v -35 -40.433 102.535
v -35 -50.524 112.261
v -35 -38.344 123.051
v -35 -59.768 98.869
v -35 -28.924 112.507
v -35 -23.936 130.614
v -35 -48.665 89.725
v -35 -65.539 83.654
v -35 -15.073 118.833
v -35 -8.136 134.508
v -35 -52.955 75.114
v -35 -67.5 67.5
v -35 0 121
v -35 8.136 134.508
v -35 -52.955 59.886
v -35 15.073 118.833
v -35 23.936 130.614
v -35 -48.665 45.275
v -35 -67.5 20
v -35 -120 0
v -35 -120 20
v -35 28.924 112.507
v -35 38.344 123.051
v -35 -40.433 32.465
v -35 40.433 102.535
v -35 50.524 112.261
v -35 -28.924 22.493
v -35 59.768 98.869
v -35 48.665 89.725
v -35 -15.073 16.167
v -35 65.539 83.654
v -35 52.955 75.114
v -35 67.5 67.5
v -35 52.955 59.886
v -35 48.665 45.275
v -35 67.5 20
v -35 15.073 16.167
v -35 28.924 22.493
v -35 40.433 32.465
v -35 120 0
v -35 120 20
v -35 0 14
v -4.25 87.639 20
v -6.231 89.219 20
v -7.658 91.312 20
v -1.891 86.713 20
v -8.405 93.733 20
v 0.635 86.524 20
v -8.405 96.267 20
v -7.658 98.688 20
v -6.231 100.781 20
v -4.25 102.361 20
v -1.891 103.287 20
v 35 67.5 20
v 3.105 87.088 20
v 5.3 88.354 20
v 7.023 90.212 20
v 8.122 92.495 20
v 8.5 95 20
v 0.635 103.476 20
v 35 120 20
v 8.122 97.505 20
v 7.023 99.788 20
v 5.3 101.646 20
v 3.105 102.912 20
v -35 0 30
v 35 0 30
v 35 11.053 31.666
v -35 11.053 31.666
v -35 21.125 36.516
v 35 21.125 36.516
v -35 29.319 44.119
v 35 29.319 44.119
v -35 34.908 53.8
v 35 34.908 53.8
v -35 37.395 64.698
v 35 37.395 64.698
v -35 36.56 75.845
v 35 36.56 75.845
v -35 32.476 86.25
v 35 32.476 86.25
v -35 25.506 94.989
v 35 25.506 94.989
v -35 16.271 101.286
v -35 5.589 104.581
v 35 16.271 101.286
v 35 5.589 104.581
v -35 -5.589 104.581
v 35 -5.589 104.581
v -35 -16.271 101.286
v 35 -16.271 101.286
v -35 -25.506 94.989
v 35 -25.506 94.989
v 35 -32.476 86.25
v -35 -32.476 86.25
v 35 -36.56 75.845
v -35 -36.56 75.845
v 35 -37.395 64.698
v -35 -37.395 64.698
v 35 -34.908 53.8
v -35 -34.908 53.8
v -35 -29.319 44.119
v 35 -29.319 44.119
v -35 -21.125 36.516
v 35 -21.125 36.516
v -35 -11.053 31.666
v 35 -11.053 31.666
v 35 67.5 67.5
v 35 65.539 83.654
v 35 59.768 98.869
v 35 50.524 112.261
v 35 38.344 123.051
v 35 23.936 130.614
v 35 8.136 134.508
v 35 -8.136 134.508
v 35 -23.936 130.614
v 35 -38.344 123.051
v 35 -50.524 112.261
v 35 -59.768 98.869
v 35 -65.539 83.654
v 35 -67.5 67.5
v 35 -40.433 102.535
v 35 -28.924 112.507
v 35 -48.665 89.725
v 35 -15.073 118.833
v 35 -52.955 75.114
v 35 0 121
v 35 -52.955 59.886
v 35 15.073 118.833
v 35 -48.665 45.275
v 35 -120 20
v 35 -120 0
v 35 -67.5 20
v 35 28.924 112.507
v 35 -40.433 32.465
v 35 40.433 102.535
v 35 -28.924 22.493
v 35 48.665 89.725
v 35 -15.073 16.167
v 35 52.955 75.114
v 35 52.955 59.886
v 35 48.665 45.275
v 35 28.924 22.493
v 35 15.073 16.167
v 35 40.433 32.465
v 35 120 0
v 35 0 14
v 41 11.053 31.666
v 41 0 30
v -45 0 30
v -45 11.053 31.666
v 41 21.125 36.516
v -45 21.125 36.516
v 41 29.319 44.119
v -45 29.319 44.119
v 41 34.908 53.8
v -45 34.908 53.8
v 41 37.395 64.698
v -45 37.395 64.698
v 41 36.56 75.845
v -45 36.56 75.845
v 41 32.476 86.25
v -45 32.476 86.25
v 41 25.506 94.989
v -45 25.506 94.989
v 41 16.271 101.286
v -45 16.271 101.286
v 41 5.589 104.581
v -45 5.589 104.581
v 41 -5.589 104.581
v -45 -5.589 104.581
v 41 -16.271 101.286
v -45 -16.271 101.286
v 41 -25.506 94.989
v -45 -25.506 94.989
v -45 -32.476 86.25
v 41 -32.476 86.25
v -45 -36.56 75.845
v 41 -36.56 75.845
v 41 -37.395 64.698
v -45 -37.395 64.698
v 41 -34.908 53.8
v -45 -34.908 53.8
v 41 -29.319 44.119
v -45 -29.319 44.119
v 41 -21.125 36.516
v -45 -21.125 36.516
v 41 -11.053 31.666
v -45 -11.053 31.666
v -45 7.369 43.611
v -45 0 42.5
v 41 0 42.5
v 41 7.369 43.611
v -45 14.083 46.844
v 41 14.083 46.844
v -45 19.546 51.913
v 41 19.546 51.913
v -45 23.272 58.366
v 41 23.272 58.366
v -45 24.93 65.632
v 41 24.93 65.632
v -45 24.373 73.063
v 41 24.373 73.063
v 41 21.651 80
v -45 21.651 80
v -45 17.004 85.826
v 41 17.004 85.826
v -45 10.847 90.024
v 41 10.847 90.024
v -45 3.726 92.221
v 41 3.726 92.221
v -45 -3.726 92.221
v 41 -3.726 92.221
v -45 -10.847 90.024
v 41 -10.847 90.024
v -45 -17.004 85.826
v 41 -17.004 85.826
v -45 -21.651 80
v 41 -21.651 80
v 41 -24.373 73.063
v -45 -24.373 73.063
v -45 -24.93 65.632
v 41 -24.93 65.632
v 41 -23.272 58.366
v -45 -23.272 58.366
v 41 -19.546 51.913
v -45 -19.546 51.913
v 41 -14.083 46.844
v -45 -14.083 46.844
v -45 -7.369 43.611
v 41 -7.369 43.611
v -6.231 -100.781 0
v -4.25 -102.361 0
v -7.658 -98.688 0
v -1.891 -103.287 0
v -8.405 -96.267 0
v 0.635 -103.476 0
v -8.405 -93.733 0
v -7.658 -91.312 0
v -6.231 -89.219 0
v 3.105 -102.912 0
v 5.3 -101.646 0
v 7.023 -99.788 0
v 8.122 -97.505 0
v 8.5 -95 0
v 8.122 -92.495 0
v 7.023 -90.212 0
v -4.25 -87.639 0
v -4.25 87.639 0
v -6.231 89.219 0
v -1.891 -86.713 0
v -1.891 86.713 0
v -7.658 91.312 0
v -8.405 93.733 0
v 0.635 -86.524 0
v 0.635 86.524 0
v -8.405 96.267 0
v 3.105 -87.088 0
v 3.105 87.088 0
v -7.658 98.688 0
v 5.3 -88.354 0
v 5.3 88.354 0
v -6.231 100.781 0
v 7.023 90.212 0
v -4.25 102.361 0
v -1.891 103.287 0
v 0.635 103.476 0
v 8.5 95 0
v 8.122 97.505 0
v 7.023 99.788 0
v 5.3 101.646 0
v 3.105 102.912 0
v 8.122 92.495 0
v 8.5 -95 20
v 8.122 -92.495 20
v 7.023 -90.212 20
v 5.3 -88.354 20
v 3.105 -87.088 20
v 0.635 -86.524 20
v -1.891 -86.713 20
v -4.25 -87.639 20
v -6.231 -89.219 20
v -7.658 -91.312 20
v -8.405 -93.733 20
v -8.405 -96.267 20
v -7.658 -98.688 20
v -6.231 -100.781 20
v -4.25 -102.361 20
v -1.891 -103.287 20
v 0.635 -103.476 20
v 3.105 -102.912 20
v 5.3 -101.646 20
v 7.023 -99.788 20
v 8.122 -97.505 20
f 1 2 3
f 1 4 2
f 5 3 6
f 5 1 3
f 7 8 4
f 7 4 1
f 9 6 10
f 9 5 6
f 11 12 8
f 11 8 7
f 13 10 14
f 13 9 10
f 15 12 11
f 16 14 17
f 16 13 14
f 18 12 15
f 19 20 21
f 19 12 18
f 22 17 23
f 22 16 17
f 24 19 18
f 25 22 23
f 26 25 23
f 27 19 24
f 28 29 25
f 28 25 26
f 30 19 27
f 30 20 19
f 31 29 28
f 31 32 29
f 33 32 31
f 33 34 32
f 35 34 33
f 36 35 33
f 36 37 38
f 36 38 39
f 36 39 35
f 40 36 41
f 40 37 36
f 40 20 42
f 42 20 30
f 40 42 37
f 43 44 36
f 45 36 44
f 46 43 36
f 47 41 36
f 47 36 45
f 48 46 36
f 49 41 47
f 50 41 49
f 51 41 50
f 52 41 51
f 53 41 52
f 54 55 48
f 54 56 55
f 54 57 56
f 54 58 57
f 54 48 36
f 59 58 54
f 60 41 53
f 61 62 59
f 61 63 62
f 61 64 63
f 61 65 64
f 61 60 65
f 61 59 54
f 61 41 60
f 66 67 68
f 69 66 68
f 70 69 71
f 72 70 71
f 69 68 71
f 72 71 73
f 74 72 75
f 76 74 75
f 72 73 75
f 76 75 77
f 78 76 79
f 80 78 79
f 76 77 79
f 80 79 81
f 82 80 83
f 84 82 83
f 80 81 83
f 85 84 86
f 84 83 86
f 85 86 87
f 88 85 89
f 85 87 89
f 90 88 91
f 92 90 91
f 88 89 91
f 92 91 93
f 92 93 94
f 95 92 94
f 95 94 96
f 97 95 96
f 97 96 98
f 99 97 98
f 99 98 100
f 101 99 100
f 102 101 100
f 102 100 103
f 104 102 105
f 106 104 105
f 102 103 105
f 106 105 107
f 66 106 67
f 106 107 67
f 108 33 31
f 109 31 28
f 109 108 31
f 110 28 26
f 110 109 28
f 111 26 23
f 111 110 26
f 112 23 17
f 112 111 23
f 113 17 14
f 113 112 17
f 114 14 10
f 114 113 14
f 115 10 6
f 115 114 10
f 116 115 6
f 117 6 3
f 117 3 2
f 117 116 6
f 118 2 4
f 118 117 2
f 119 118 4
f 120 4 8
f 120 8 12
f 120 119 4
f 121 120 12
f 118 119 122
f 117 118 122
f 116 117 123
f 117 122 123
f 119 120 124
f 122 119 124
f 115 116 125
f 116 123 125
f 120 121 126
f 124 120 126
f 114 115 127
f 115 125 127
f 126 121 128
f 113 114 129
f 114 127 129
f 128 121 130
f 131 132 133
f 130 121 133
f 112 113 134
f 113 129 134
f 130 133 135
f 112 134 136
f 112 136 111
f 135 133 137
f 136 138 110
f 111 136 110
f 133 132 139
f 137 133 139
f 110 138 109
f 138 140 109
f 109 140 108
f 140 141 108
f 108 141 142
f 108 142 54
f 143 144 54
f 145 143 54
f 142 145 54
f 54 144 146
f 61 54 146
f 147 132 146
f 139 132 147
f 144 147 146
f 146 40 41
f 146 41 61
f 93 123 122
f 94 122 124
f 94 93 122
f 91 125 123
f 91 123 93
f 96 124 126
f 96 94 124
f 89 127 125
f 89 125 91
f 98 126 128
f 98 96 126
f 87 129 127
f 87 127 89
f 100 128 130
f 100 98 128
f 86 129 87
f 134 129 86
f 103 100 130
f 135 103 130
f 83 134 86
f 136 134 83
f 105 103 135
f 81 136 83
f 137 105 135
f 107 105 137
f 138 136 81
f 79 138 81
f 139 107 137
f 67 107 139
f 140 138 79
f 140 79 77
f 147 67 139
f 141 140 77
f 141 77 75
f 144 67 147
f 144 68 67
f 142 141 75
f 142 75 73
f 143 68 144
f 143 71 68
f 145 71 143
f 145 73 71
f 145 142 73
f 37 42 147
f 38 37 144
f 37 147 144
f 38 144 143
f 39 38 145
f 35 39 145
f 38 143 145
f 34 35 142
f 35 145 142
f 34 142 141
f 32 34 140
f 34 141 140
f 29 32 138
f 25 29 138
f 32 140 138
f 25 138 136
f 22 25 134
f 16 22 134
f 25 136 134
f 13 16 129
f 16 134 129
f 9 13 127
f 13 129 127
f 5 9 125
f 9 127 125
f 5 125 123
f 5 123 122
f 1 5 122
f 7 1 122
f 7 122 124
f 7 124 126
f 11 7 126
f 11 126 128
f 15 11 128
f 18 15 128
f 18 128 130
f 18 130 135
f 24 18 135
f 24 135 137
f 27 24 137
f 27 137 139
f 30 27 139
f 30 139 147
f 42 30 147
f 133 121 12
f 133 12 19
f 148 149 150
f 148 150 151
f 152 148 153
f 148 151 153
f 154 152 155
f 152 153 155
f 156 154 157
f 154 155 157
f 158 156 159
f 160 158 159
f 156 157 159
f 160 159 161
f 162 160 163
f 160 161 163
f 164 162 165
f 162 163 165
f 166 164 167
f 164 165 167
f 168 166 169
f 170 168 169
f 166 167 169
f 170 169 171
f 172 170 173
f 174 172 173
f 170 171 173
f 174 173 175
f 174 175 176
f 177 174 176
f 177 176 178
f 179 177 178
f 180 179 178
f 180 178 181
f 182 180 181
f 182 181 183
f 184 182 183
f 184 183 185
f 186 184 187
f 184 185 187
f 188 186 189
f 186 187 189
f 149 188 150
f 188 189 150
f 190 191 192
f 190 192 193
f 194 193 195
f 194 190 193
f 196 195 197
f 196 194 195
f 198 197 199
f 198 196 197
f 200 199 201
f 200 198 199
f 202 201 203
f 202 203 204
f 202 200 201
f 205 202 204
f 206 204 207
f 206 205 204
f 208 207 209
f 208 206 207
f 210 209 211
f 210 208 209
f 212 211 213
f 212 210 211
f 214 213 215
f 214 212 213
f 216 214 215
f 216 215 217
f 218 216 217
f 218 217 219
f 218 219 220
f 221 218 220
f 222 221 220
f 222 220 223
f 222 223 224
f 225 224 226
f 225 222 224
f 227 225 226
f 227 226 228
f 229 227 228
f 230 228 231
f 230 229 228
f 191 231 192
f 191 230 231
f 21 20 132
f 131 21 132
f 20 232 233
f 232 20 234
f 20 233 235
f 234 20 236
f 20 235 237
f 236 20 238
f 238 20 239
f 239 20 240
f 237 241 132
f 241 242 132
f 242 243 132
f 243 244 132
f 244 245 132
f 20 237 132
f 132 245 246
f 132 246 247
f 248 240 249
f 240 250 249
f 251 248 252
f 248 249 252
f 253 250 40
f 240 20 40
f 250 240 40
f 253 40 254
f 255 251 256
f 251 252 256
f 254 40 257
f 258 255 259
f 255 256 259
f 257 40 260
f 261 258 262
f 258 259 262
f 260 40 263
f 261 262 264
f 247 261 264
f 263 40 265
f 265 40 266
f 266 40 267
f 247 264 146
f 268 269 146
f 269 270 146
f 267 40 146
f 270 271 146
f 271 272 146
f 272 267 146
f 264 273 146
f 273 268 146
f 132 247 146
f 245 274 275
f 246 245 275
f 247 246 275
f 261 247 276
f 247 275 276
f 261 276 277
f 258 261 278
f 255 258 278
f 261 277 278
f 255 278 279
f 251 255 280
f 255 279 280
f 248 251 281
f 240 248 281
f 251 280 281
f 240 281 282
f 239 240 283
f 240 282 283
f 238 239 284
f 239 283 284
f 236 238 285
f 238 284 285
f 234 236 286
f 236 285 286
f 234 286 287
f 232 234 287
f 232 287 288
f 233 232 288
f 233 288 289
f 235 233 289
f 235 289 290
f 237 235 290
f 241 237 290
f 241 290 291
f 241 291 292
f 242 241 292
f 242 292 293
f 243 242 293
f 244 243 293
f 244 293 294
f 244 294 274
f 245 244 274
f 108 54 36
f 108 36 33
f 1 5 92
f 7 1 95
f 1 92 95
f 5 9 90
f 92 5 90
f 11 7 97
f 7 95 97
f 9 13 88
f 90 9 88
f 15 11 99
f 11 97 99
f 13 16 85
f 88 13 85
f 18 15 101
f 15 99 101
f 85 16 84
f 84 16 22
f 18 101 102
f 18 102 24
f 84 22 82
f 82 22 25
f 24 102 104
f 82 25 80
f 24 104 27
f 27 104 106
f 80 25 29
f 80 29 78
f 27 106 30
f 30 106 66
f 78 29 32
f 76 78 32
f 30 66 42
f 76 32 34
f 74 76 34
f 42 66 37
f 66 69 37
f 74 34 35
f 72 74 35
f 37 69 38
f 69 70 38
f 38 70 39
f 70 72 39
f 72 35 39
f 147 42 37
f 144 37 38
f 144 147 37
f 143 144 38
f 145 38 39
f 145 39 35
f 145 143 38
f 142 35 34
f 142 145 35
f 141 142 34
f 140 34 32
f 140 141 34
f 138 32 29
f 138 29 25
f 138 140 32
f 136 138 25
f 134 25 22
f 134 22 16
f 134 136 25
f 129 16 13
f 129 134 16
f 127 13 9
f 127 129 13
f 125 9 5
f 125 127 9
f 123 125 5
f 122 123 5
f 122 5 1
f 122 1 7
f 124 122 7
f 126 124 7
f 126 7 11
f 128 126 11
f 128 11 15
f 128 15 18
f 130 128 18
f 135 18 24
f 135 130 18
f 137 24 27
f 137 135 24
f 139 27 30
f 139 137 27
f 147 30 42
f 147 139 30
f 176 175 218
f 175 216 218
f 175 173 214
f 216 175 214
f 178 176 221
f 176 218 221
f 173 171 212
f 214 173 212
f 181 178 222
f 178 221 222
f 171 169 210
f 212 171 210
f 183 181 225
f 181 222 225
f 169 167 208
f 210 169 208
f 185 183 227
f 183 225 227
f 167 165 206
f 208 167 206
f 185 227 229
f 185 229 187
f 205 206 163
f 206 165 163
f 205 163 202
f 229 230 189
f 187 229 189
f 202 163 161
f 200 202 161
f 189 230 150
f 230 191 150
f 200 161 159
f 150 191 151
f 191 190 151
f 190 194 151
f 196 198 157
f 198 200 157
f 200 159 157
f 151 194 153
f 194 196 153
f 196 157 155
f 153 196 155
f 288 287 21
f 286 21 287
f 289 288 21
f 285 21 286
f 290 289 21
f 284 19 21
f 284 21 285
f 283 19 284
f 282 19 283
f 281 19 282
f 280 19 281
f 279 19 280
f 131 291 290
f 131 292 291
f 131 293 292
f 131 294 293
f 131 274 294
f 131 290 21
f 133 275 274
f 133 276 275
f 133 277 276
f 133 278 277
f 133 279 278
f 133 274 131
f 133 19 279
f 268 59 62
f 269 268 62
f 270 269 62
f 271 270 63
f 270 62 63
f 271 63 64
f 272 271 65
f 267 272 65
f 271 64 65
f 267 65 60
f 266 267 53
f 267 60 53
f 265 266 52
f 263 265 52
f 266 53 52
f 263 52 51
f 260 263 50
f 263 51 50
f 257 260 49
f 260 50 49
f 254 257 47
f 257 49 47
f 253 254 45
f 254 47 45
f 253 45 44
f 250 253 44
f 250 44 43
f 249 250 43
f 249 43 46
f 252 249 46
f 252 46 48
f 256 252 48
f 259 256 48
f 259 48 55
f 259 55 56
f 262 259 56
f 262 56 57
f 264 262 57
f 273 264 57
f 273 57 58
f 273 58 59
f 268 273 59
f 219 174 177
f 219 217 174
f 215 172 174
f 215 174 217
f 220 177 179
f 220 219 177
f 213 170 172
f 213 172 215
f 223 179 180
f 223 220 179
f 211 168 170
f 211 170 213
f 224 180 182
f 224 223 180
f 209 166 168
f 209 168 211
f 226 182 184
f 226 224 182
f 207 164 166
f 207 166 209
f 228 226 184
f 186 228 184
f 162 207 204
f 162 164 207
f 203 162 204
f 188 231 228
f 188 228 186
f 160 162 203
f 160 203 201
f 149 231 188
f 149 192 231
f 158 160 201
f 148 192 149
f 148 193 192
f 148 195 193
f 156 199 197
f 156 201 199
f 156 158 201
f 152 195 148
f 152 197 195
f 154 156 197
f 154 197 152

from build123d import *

# Parameters (mm, degrees)
SKETCH1_W                       = 70
SKETCH1_H                       = 240
BOSS_EXTRUDE1_DEPTH             = 20
BOSS_EXTRUDE2_REACH             = 128.59
SKETCH2_R                       = 67.5
BOSS_EXTRUDE2_DIRECTION_2_REACH = 128.59
BOSS_EXTRUDE3_REACH             = 185.984
BOSS_EXTRUDE3_DIRECTION_2_REACH = 185.984
SKETCH4_R                       = 53.5
CUT_EXTRUDE1_DEPTH              = 216
SKETCH5_R                       = 53.5
SKETCH5_R_2                     = 37.5
BOSS_EXTRUDE4_DEPTH             = 70
BOSS_EXTRUDE6_DEPTH             = 41
BOSS_EXTRUDE6_DEPTH_BACK        = 45
SKETCH6_R                       = 37.5
SKETCH6_R_2                     = 25
SKETCH7_R                       = 8.5
CUT_EXTRUDE2_DEPTH              = 58


with BuildPart() as part:
    # Sketch1 → Boss-Extrude1 (new body)
    with BuildSketch(Plane.XY):
        Rectangle(SKETCH1_W, SKETCH1_H)
    extrude(amount=BOSS_EXTRUDE1_DEPTH)

    # Boss-Extrude2: up to this face of the body (flat: up to its plane)
    boss_extrude2_end = Plane(part.part.faces().sort_by_distance((35, 0, 10))[0])
    # Sketch2 → Boss-Extrude2 (add, up to the picked face)
    with BuildSketch(Plane(origin=(0, 0, 0), x_dir=(0, 0, -1), z_dir=(1, 0, 0)), mode=Mode.PRIVATE) as boss_extrude2_sk1:
        with Locations((-67.5, 0)):
            Circle(SKETCH2_R)
    boss_extrude2_tool1 = split(extrude(boss_extrude2_sk1.sketch, amount=BOSS_EXTRUDE2_REACH, mode=Mode.PRIVATE), bisect_by=boss_extrude2_end, keep=Keep.BOTH, mode=Mode.PRIVATE)
    add(boss_extrude2_tool1.solids().sort_by(Axis((0, 0, 67.5), (1, 0, 0)))[0])

    # Boss-Extrude2 direction 2: up to this face of the body (flat: up to its plane)
    boss_extrude2_direction_2_end = Plane(part.part.faces().sort_by_distance((-35, 0, 10))[0])
    # Sketch2 → Boss-Extrude2 direction 2 (add, up to the picked face)
    with BuildSketch(Plane(origin=(0, 0, 0), x_dir=(0, 0, -1), z_dir=(1, 0, 0)), mode=Mode.PRIVATE) as boss_extrude2_direction_2_sk1:
        with Locations((-67.5, 0)):
            Circle(SKETCH2_R)
    boss_extrude2_direction_2_tool1 = split(extrude(boss_extrude2_direction_2_sk1.sketch, amount=-BOSS_EXTRUDE2_DIRECTION_2_REACH, mode=Mode.PRIVATE), bisect_by=boss_extrude2_direction_2_end, keep=Keep.BOTH, mode=Mode.PRIVATE)
    add(boss_extrude2_direction_2_tool1.solids().sort_by(Axis((0, 0, 67.5), (-1, 0, 0)))[0])

    # Boss-Extrude3: up to this face of the body (flat: up to its plane)
    boss_extrude3_end = Plane(part.part.faces().sort_by_distance((35, 0, 56.120224161))[0])
    # Sketch3 → Boss-Extrude3 (add, up to the picked face)
    with BuildSketch(Plane(origin=(0, 0, 0), x_dir=(0, 0, -1), z_dir=(1, 0, 0)), mode=Mode.PRIVATE) as boss_extrude3_sk1:
        with BuildLine():
            ThreePointArc((-20, -47.958315233), (-41.818647604, -62.423698538), (-67.5, -67.5))
            Line((-67.5, -67.5), (-20, -67.5))
            Line((-20, -67.5), (-20, -47.958315233))
        make_face()
    boss_extrude3_tool1 = split(extrude(boss_extrude3_sk1.sketch, amount=BOSS_EXTRUDE3_REACH, mode=Mode.PRIVATE), bisect_by=boss_extrude3_end, keep=Keep.BOTH, mode=Mode.PRIVATE)
    # Sketch3 → Boss-Extrude3 (add, up to the picked face)
    with BuildSketch(Plane(origin=(0, 0, 0), x_dir=(0, 0, -1), z_dir=(1, 0, 0)), mode=Mode.PRIVATE) as boss_extrude3_sk2:
        with BuildLine():
            ThreePointArc((-67.5, 67.5), (-41.818647604, 62.423698538), (-20, 47.958315233))
            Line((-20, 47.958315233), (-20, 67.5))
            Line((-20, 67.5), (-67.5, 67.5))
        make_face()
    boss_extrude3_tool2 = split(extrude(boss_extrude3_sk2.sketch, amount=BOSS_EXTRUDE3_REACH, mode=Mode.PRIVATE), bisect_by=boss_extrude3_end, keep=Keep.BOTH, mode=Mode.PRIVATE)
    add(boss_extrude3_tool1.solids().sort_by(Axis((0, -61.818458, 31.503722), (1, 0, 0)))[0])
    add(boss_extrude3_tool2.solids().sort_by(Axis((0, 61.818458, 31.503722), (1, 0, 0)))[0])

    # Boss-Extrude3 direction 2: up to this face of the body (flat: up to its plane)
    boss_extrude3_direction_2_end = Plane(part.part.faces().sort_by_distance((-35, 0, 56.120224161))[0])
    # Sketch3 → Boss-Extrude3 direction 2 (add, up to the picked face)
    with BuildSketch(Plane(origin=(0, 0, 0), x_dir=(0, 0, -1), z_dir=(1, 0, 0)), mode=Mode.PRIVATE) as boss_extrude3_direction_2_sk1:
        with BuildLine():
            ThreePointArc((-20, -47.958315233), (-41.818647604, -62.423698538), (-67.5, -67.5))
            Line((-67.5, -67.5), (-20, -67.5))
            Line((-20, -67.5), (-20, -47.958315233))
        make_face()
    boss_extrude3_direction_2_tool1 = split(extrude(boss_extrude3_direction_2_sk1.sketch, amount=-BOSS_EXTRUDE3_DIRECTION_2_REACH, mode=Mode.PRIVATE), bisect_by=boss_extrude3_direction_2_end, keep=Keep.BOTH, mode=Mode.PRIVATE)
    # Sketch3 → Boss-Extrude3 direction 2 (add, up to the picked face)
    with BuildSketch(Plane(origin=(0, 0, 0), x_dir=(0, 0, -1), z_dir=(1, 0, 0)), mode=Mode.PRIVATE) as boss_extrude3_direction_2_sk2:
        with BuildLine():
            ThreePointArc((-67.5, 67.5), (-41.818647604, 62.423698538), (-20, 47.958315233))
            Line((-20, 47.958315233), (-20, 67.5))
            Line((-20, 67.5), (-67.5, 67.5))
        make_face()
    boss_extrude3_direction_2_tool2 = split(extrude(boss_extrude3_direction_2_sk2.sketch, amount=-BOSS_EXTRUDE3_DIRECTION_2_REACH, mode=Mode.PRIVATE), bisect_by=boss_extrude3_direction_2_end, keep=Keep.BOTH, mode=Mode.PRIVATE)
    add(boss_extrude3_direction_2_tool1.solids().sort_by(Axis((0, -61.818458, 31.503722), (-1, 0, 0)))[0])
    add(boss_extrude3_direction_2_tool2.solids().sort_by(Axis((0, 61.818458, 31.503722), (-1, 0, 0)))[0])

    # Sketch4 → Cut-Extrude1 (cut)
    with BuildSketch(Plane(origin=(35, 0, 0), x_dir=(0, 0, -1), z_dir=(1, 0, 0))):
        with Locations((-67.5, 0)):
            Circle(SKETCH4_R)
    extrude(amount=-CUT_EXTRUDE1_DEPTH, mode=Mode.SUBTRACT)

    # Sketch7 → Cut-Extrude2 (cut)
    with BuildSketch(Plane.XY.offset(20)):
        with Locations((0, -95)):
            Circle(SKETCH7_R)
        with Locations((0, 95)):
            Circle(SKETCH7_R)
    extrude(amount=-CUT_EXTRUDE2_DEPTH, mode=Mode.SUBTRACT)


with BuildPart() as body_2:
    # Sketch5 → Boss-Extrude4 (new body)
    with BuildSketch(Plane(origin=(35, 0, 0), x_dir=(0, 0, -1), z_dir=(1, 0, 0))):
        with Locations((-67.5, 0)):
            Circle(SKETCH5_R)
        with Locations((-67.5, 0)):
            Circle(SKETCH5_R_2, mode=Mode.SUBTRACT)
    extrude(amount=-BOSS_EXTRUDE4_DEPTH)


with BuildPart() as body_3:
    # Sketch6 → Boss-Extrude6 (new, two sides: drawn at the far end of the back side and taken through both)
    with BuildSketch(Plane(origin=(0, 0, 0), x_dir=(0, 0, -1), z_dir=(1, 0, 0)).offset(-BOSS_EXTRUDE6_DEPTH_BACK)):
        with Locations((-67.5, 0)):
            Circle(SKETCH6_R)
        with Locations((-67.5, 0)):
            Circle(SKETCH6_R_2, mode=Mode.SUBTRACT)
    extrude(amount=BOSS_EXTRUDE6_DEPTH + BOSS_EXTRUDE6_DEPTH_BACK)


solid = Compound([part.part, body_2.part, body_3.part])
